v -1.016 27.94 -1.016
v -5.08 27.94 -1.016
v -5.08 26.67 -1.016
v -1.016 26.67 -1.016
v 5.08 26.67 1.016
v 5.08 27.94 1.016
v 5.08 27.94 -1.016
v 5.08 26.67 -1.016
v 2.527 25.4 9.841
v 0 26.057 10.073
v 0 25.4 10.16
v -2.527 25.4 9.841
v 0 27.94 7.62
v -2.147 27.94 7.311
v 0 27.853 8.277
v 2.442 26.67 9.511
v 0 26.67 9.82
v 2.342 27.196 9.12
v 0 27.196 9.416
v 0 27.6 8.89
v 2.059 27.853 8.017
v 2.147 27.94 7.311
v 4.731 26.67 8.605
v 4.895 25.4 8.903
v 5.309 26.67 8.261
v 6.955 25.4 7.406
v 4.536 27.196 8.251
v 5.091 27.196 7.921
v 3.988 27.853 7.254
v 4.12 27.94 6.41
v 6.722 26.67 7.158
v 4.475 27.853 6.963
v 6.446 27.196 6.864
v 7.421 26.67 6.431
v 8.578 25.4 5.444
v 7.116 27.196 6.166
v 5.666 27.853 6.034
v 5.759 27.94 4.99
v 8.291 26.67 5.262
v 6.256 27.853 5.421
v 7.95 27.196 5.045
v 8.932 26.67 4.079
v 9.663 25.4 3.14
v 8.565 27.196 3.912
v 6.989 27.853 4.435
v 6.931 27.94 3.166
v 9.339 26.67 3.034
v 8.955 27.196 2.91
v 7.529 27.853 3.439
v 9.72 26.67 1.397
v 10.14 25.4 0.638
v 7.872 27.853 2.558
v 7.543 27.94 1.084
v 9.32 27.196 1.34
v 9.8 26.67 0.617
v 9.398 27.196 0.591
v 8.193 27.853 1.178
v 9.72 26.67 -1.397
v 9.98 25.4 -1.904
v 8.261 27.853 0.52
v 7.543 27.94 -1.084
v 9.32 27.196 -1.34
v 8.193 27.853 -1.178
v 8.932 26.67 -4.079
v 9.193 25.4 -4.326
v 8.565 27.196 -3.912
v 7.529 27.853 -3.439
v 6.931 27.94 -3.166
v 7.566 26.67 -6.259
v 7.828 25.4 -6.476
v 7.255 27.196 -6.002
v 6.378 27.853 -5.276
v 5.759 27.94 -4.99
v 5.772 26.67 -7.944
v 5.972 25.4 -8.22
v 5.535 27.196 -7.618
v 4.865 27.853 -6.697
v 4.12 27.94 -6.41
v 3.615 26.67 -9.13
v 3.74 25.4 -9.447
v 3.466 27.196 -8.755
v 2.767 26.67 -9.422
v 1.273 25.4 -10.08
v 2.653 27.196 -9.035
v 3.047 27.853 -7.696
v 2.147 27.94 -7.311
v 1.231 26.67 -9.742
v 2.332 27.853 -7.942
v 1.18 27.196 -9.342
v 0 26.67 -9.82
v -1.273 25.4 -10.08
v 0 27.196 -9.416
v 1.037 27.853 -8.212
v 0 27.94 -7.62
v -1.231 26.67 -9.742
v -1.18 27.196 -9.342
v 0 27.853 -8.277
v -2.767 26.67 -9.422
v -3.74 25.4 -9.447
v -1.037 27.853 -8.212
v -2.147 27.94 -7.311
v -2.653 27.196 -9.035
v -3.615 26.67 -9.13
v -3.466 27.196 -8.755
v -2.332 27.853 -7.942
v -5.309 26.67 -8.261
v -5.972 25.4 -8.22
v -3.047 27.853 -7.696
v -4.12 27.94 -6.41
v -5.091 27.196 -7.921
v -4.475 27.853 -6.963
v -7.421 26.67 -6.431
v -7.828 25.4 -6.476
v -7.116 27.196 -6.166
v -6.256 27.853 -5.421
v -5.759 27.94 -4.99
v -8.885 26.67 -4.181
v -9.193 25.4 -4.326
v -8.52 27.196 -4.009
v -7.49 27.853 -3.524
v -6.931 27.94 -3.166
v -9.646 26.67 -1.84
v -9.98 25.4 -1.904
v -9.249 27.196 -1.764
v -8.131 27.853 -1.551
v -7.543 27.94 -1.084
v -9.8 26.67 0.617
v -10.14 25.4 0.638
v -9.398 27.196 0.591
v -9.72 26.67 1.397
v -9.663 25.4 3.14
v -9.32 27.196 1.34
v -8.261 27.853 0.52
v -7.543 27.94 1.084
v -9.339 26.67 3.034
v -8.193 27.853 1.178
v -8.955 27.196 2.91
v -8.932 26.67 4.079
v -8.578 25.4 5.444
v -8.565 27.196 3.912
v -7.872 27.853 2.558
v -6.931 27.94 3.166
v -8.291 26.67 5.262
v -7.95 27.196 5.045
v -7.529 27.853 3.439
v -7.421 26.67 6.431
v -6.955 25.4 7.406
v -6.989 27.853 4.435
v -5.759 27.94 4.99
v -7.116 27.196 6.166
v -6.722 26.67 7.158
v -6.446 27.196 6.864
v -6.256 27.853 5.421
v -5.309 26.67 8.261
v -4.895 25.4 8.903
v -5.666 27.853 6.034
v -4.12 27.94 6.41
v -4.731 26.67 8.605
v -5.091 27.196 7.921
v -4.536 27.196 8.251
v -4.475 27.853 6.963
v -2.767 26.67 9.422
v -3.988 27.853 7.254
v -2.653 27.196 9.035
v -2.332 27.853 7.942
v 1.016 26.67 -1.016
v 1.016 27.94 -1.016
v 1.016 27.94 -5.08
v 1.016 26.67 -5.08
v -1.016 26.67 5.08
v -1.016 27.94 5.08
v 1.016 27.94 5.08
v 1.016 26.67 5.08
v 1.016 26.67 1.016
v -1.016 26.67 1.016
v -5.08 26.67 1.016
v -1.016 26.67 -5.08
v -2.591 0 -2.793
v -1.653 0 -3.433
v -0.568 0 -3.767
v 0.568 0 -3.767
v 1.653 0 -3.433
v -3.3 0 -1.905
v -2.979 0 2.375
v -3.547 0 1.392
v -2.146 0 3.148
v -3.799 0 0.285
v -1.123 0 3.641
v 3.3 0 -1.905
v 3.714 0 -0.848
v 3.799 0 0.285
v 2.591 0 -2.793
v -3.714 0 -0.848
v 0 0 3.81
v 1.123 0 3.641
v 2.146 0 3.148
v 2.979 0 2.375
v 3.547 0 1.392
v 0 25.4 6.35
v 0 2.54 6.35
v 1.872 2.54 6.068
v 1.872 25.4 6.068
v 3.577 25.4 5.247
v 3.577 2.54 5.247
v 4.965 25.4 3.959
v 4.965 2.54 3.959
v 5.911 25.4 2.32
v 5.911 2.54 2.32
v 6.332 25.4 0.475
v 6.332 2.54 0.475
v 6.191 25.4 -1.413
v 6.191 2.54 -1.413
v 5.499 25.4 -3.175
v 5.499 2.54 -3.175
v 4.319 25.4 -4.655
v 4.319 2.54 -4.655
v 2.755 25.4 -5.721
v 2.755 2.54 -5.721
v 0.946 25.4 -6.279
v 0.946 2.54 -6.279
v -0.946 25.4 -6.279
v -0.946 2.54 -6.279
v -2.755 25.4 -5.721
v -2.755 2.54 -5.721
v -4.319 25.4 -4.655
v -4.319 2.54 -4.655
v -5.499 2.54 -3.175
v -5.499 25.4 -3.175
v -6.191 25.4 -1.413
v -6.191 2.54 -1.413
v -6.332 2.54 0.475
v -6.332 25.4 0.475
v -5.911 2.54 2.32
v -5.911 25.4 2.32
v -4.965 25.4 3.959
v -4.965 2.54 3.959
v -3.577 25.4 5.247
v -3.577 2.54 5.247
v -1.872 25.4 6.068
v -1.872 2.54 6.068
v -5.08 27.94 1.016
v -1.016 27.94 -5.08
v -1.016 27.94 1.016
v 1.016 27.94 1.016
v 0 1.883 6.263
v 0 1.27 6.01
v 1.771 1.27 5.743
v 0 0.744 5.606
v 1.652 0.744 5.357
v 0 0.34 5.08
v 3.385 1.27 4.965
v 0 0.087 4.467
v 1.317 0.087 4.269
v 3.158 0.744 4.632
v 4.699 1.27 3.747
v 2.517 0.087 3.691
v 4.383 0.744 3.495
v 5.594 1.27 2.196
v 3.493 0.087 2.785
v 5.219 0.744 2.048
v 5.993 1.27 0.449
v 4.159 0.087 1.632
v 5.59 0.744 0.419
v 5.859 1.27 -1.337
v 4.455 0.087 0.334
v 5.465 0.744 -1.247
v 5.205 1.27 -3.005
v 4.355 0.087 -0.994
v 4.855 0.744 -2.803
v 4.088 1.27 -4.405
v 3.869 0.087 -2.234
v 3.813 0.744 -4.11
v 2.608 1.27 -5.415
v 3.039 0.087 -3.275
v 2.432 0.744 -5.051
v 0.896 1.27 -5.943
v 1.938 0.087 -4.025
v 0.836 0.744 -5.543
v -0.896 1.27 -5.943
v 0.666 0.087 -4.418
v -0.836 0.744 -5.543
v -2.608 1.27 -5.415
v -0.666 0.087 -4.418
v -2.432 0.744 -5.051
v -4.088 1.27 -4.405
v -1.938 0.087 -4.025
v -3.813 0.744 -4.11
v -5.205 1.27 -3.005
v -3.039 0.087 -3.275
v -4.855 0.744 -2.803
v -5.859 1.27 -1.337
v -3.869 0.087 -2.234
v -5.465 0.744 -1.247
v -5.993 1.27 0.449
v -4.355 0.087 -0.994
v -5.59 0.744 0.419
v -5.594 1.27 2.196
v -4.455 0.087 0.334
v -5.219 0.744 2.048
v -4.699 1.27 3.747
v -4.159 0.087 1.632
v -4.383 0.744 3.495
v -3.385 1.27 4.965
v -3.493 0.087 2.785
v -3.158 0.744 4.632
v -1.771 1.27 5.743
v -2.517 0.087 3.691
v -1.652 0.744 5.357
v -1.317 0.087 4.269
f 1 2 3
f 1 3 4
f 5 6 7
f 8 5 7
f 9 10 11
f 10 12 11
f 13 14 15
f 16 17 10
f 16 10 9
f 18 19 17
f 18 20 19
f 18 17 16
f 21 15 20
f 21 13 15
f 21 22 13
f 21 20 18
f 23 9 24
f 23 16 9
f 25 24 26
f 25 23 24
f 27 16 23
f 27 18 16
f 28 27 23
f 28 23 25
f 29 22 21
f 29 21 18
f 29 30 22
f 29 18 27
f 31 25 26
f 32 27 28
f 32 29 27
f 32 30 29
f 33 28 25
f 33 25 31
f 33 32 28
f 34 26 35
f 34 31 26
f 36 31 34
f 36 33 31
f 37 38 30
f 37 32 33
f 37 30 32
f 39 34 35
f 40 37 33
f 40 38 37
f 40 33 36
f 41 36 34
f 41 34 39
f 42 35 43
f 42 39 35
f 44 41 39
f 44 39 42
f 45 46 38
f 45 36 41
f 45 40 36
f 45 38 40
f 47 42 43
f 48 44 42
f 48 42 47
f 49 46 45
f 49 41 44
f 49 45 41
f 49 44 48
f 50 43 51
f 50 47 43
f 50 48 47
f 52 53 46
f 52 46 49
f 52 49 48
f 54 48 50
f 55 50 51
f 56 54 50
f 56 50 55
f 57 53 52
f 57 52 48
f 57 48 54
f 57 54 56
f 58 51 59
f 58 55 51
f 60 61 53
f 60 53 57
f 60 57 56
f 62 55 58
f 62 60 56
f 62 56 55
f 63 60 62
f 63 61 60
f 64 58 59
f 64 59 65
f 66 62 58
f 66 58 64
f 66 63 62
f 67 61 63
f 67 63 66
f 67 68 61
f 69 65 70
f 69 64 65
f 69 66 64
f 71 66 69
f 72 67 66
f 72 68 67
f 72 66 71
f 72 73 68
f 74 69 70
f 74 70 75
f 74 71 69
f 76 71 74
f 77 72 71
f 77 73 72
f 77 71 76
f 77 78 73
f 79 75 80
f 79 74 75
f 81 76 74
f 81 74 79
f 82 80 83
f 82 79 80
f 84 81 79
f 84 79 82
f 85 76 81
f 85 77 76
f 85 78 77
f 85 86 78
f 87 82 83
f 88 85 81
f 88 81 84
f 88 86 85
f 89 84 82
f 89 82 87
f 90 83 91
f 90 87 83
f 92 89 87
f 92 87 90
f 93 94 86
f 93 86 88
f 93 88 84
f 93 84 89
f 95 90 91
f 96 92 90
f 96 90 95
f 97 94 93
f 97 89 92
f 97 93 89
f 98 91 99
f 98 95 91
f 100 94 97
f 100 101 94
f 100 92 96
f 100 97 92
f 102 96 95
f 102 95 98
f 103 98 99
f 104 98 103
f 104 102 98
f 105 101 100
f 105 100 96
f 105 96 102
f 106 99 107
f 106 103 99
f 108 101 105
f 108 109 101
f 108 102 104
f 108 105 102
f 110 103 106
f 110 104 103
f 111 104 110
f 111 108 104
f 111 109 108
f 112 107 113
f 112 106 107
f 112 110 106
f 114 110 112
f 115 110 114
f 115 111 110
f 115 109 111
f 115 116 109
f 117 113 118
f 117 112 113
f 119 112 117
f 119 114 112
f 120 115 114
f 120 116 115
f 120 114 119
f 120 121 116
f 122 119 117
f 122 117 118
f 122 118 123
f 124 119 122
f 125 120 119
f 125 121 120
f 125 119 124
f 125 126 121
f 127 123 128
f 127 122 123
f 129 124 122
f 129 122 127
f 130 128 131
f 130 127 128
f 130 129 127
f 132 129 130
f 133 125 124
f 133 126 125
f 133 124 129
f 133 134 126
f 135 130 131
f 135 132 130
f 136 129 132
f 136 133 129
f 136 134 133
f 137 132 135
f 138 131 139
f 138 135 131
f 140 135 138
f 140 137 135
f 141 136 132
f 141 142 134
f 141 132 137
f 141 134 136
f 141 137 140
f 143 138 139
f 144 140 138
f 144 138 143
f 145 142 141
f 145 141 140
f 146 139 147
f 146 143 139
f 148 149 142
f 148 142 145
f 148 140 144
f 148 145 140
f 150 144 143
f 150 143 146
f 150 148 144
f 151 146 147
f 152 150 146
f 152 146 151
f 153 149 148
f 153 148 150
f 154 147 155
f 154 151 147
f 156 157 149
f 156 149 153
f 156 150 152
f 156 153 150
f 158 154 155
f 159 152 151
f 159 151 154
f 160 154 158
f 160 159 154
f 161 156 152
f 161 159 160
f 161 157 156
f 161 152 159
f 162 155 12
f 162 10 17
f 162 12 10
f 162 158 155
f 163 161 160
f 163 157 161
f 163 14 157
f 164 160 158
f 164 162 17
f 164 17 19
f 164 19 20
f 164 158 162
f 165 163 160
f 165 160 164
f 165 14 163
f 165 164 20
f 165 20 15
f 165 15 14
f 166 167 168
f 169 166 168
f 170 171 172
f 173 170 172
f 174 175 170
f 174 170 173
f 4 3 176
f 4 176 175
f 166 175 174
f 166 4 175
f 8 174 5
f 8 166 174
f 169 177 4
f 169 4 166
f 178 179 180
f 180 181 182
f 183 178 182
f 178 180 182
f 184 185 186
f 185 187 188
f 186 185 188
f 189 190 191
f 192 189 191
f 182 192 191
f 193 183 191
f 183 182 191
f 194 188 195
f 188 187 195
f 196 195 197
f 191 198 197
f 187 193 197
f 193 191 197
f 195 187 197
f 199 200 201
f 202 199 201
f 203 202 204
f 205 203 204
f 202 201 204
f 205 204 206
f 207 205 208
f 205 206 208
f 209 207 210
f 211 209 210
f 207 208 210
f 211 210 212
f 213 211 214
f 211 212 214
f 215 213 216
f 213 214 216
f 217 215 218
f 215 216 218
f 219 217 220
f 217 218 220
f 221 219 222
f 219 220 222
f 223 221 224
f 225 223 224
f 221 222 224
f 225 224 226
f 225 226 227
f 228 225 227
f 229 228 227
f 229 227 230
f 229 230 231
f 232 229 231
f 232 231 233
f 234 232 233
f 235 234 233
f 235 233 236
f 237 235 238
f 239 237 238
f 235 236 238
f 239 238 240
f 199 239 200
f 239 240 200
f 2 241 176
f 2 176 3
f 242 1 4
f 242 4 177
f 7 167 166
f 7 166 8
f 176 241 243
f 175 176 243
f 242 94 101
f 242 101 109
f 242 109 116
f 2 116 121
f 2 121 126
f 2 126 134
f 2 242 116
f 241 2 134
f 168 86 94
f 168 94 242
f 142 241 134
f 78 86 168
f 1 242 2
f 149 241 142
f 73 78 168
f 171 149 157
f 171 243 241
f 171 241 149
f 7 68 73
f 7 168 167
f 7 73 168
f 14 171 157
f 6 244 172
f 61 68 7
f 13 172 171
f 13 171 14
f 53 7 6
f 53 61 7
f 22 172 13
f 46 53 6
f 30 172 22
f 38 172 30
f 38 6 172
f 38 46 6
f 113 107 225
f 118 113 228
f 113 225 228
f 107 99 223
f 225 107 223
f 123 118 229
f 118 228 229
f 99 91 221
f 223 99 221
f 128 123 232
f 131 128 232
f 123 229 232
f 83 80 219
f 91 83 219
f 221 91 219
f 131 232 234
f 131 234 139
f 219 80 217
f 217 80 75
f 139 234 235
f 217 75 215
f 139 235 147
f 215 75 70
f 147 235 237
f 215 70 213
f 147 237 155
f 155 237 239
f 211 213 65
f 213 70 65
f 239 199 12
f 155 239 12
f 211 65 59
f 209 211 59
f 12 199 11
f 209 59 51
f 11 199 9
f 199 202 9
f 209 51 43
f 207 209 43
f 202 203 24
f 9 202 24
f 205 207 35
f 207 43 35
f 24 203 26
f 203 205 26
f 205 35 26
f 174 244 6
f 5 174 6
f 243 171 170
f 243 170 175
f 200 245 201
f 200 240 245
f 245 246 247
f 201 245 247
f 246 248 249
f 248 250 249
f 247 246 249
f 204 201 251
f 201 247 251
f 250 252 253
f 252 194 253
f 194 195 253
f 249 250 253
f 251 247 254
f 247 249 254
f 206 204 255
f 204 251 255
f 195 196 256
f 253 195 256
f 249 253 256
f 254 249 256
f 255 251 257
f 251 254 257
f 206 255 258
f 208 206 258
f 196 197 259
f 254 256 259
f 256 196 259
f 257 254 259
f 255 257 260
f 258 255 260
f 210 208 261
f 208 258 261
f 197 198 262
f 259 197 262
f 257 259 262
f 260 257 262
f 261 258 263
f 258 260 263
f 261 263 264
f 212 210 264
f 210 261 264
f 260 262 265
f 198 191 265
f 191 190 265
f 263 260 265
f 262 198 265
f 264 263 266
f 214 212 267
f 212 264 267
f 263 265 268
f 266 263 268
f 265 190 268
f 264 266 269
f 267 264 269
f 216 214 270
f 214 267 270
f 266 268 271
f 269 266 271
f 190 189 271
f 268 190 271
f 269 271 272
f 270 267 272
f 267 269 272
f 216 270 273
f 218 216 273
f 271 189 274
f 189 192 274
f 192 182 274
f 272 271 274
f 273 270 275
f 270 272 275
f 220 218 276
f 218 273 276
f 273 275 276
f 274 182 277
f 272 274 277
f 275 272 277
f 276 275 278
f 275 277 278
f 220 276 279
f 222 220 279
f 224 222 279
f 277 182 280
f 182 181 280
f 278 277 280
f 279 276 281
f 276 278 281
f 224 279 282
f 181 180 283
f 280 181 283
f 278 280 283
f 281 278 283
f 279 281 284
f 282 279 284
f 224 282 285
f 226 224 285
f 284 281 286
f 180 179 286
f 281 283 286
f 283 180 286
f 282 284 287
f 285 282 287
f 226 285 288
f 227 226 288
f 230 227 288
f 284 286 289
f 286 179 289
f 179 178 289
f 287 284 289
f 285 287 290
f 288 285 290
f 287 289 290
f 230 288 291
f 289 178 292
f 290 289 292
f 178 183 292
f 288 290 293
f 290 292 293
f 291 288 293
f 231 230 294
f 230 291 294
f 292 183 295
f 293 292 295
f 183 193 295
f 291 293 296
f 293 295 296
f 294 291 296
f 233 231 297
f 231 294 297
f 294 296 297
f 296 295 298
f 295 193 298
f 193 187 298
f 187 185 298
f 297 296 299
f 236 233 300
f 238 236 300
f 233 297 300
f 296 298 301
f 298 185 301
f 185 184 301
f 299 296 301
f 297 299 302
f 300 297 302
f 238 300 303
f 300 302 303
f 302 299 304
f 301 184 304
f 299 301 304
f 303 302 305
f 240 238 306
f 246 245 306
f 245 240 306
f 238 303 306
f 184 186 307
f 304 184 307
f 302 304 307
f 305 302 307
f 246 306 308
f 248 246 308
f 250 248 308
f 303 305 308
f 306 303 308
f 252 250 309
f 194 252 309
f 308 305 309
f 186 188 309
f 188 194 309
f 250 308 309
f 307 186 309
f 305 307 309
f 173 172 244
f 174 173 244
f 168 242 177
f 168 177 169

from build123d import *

# Parameters (mm, degrees)
SKETCH1_R           = 6.35
BOSS_EXTRUDE1_DEPTH = 25.4
SKETCH2_R           = 10.16
BOSS_EXTRUDE2_DEPTH = 2.54
FILLET1_R           = 2.54
SKETCH3_W           = 4.064
SKETCH3_H           = 2.032
SKETCH3_W_2         = 2.032
SKETCH3_H_2         = 4.064
CUT_EXTRUDE1_DEPTH  = 1.27
FILLET2_R           = 2.54


with BuildPart() as part:
    # Sketch1 → Boss-Extrude1 (new body)
    with BuildSketch(Plane(origin=(0, 0, 0), x_dir=(1, 0, 0), z_dir=(0, 1, 0))):
        with Locations(Location((0, 0, 0), (0, 0, 270))):
            Circle(SKETCH1_R)
    extrude(amount=BOSS_EXTRUDE1_DEPTH)

    # Sketch2 → Boss-Extrude2 (add)
    with BuildSketch(Plane(origin=(0, 25.4, 0), x_dir=(1, 0, 0), z_dir=(0, 1, 0))):
        with Locations(Location((0, 0, 0), (0, 0, 270))):
            Circle(SKETCH2_R)
    extrude(amount=BOSS_EXTRUDE2_DEPTH)

    # Fillet1
    fillet1_edges = [part.edges().sort_by_distance(p)[0] for p in [
        (0, 27.94, -10.16),
    ]]
    fillet(fillet1_edges, radius=FILLET1_R - 0.0001)  # a hair under: the kernel refuses the full size

    # Sketch3 → Cut-Extrude1 (cut)
    with BuildSketch(Plane(origin=(0, 27.94, 0), x_dir=(1, 0, 0), z_dir=(0, 1, 0))):
        with Locations((-3.048, 0)):
            Rectangle(SKETCH3_W, SKETCH3_H)
        with Locations((0, 3.048)):
            Rectangle(SKETCH3_W_2, SKETCH3_H_2)
        with Locations((3.048, 0)):
            Rectangle(SKETCH3_W, SKETCH3_H)
        Rectangle(SKETCH3_W_2, SKETCH3_H)
        with Locations((0, -3.048)):
            Rectangle(SKETCH3_W_2, SKETCH3_H_2)
    extrude(amount=-CUT_EXTRUDE1_DEPTH, mode=Mode.SUBTRACT)

    # Fillet2
    fillet2_edges = [part.edges().sort_by_distance(p)[0] for p in [
        (0, 0, -6.35),
    ]]
    fillet(fillet2_edges, radius=FILLET2_R)


solid = part.part
